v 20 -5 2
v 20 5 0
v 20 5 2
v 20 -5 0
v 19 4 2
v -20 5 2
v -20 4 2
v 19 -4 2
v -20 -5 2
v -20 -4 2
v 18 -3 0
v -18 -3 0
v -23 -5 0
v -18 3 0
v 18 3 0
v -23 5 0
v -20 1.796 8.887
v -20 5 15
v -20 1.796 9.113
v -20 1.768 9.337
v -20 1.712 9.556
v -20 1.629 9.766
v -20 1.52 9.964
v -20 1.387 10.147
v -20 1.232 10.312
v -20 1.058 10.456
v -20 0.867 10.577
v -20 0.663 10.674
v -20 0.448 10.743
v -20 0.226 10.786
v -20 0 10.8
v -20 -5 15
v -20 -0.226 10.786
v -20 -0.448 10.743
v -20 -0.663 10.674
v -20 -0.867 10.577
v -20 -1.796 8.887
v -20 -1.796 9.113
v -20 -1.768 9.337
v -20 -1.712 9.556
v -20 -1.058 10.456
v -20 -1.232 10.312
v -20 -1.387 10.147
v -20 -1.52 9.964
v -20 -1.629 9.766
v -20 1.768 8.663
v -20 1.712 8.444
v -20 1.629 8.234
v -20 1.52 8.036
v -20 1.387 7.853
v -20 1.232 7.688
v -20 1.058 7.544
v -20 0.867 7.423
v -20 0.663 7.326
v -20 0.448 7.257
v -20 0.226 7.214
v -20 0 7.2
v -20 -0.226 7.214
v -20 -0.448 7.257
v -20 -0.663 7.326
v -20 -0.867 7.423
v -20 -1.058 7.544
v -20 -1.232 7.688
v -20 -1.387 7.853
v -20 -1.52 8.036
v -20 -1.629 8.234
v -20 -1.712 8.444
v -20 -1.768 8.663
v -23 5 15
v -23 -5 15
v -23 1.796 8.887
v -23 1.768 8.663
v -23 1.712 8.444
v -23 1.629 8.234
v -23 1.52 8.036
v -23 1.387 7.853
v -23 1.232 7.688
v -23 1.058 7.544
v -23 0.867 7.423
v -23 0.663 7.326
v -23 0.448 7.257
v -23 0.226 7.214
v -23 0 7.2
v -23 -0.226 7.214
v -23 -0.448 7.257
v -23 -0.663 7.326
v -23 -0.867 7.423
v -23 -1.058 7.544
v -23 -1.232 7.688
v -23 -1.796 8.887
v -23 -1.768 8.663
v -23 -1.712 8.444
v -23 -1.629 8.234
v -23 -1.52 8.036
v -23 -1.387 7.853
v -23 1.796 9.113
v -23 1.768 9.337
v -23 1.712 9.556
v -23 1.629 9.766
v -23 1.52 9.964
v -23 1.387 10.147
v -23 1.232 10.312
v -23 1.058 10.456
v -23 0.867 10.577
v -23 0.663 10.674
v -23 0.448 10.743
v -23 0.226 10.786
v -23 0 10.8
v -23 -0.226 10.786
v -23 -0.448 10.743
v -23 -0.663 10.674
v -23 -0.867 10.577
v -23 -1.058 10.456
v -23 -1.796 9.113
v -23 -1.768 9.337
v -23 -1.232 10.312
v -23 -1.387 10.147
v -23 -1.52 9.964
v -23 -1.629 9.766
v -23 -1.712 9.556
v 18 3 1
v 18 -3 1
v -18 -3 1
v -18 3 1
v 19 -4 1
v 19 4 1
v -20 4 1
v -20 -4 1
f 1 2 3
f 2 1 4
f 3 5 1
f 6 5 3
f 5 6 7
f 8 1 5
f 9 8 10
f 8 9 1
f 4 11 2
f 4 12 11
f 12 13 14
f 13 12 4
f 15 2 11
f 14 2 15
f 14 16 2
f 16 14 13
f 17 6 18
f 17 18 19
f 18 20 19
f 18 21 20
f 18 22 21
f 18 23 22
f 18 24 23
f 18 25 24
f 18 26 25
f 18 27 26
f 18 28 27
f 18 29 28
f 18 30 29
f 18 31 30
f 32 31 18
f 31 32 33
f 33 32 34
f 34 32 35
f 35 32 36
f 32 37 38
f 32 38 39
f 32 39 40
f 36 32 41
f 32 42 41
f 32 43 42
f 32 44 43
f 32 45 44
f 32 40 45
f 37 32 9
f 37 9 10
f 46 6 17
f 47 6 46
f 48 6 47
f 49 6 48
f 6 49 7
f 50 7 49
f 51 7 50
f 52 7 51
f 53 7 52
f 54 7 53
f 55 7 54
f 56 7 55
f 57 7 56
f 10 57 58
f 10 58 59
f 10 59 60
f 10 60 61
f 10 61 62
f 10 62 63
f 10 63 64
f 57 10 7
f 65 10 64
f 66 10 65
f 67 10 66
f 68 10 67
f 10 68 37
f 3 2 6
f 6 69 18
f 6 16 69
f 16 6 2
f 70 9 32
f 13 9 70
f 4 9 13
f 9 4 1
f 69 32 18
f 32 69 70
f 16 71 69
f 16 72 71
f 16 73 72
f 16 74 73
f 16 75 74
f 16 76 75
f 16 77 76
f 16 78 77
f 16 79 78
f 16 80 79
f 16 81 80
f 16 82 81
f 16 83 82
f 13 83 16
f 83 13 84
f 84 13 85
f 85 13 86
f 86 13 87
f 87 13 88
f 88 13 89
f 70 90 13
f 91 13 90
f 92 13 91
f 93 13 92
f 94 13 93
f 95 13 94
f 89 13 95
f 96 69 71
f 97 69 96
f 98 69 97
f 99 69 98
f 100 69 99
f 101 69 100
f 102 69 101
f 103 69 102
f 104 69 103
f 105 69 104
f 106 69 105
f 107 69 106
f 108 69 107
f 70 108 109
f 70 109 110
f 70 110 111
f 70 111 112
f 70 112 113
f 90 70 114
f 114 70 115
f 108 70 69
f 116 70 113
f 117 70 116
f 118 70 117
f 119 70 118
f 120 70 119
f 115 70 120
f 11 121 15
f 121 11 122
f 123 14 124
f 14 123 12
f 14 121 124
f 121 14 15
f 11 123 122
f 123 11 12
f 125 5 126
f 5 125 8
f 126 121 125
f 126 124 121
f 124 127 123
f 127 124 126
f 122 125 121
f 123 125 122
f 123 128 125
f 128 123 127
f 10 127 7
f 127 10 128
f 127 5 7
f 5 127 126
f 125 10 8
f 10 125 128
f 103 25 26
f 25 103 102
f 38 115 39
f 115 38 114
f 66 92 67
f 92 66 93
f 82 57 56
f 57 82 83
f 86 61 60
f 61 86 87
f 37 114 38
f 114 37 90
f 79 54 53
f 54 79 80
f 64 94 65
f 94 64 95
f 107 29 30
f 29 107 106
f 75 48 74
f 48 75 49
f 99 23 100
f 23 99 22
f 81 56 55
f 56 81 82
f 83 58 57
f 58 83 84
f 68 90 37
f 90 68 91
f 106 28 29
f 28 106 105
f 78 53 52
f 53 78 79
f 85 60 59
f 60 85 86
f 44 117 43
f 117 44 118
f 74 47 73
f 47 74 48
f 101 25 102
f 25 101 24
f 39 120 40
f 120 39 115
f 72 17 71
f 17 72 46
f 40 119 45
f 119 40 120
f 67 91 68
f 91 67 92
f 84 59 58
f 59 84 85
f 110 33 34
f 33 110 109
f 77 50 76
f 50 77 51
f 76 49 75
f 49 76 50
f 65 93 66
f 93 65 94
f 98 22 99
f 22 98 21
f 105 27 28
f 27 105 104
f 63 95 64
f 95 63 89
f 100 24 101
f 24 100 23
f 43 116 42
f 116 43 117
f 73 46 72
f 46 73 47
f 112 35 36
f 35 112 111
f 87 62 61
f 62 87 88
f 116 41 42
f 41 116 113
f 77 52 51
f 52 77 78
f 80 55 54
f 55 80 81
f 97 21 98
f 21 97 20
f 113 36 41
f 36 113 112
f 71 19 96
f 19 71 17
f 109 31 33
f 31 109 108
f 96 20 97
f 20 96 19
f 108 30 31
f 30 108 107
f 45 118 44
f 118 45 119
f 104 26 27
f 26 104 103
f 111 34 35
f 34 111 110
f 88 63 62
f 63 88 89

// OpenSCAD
$fn = 50;


difference() {
	union() {
		translate(v = [-20.0000000000, -5.0000000000, 0]) {
			cube(size = [40, 10, 2]);
		}
		translate(v = [-23.0000000000, -5.0000000000, 0]) {
			cube(size = [3, 10, 15]);
		}
	}
	union() {
		translate(v = [-18.0000000000, -3.0000000000, 0]) {
			cube(size = [36, 6, 2]);
		}
		translate(v = [-20.0000000000, -4.0000000000, 1]) {
			cube(size = [39, 8, 1]);
		}
		#translate(v = [-30.0000000000, 0, 9]) {
			rotate(a = [0, 90, 0]) {
				cylinder(h = 20, r = 1.8000000000);
			}
		}
	}
}
